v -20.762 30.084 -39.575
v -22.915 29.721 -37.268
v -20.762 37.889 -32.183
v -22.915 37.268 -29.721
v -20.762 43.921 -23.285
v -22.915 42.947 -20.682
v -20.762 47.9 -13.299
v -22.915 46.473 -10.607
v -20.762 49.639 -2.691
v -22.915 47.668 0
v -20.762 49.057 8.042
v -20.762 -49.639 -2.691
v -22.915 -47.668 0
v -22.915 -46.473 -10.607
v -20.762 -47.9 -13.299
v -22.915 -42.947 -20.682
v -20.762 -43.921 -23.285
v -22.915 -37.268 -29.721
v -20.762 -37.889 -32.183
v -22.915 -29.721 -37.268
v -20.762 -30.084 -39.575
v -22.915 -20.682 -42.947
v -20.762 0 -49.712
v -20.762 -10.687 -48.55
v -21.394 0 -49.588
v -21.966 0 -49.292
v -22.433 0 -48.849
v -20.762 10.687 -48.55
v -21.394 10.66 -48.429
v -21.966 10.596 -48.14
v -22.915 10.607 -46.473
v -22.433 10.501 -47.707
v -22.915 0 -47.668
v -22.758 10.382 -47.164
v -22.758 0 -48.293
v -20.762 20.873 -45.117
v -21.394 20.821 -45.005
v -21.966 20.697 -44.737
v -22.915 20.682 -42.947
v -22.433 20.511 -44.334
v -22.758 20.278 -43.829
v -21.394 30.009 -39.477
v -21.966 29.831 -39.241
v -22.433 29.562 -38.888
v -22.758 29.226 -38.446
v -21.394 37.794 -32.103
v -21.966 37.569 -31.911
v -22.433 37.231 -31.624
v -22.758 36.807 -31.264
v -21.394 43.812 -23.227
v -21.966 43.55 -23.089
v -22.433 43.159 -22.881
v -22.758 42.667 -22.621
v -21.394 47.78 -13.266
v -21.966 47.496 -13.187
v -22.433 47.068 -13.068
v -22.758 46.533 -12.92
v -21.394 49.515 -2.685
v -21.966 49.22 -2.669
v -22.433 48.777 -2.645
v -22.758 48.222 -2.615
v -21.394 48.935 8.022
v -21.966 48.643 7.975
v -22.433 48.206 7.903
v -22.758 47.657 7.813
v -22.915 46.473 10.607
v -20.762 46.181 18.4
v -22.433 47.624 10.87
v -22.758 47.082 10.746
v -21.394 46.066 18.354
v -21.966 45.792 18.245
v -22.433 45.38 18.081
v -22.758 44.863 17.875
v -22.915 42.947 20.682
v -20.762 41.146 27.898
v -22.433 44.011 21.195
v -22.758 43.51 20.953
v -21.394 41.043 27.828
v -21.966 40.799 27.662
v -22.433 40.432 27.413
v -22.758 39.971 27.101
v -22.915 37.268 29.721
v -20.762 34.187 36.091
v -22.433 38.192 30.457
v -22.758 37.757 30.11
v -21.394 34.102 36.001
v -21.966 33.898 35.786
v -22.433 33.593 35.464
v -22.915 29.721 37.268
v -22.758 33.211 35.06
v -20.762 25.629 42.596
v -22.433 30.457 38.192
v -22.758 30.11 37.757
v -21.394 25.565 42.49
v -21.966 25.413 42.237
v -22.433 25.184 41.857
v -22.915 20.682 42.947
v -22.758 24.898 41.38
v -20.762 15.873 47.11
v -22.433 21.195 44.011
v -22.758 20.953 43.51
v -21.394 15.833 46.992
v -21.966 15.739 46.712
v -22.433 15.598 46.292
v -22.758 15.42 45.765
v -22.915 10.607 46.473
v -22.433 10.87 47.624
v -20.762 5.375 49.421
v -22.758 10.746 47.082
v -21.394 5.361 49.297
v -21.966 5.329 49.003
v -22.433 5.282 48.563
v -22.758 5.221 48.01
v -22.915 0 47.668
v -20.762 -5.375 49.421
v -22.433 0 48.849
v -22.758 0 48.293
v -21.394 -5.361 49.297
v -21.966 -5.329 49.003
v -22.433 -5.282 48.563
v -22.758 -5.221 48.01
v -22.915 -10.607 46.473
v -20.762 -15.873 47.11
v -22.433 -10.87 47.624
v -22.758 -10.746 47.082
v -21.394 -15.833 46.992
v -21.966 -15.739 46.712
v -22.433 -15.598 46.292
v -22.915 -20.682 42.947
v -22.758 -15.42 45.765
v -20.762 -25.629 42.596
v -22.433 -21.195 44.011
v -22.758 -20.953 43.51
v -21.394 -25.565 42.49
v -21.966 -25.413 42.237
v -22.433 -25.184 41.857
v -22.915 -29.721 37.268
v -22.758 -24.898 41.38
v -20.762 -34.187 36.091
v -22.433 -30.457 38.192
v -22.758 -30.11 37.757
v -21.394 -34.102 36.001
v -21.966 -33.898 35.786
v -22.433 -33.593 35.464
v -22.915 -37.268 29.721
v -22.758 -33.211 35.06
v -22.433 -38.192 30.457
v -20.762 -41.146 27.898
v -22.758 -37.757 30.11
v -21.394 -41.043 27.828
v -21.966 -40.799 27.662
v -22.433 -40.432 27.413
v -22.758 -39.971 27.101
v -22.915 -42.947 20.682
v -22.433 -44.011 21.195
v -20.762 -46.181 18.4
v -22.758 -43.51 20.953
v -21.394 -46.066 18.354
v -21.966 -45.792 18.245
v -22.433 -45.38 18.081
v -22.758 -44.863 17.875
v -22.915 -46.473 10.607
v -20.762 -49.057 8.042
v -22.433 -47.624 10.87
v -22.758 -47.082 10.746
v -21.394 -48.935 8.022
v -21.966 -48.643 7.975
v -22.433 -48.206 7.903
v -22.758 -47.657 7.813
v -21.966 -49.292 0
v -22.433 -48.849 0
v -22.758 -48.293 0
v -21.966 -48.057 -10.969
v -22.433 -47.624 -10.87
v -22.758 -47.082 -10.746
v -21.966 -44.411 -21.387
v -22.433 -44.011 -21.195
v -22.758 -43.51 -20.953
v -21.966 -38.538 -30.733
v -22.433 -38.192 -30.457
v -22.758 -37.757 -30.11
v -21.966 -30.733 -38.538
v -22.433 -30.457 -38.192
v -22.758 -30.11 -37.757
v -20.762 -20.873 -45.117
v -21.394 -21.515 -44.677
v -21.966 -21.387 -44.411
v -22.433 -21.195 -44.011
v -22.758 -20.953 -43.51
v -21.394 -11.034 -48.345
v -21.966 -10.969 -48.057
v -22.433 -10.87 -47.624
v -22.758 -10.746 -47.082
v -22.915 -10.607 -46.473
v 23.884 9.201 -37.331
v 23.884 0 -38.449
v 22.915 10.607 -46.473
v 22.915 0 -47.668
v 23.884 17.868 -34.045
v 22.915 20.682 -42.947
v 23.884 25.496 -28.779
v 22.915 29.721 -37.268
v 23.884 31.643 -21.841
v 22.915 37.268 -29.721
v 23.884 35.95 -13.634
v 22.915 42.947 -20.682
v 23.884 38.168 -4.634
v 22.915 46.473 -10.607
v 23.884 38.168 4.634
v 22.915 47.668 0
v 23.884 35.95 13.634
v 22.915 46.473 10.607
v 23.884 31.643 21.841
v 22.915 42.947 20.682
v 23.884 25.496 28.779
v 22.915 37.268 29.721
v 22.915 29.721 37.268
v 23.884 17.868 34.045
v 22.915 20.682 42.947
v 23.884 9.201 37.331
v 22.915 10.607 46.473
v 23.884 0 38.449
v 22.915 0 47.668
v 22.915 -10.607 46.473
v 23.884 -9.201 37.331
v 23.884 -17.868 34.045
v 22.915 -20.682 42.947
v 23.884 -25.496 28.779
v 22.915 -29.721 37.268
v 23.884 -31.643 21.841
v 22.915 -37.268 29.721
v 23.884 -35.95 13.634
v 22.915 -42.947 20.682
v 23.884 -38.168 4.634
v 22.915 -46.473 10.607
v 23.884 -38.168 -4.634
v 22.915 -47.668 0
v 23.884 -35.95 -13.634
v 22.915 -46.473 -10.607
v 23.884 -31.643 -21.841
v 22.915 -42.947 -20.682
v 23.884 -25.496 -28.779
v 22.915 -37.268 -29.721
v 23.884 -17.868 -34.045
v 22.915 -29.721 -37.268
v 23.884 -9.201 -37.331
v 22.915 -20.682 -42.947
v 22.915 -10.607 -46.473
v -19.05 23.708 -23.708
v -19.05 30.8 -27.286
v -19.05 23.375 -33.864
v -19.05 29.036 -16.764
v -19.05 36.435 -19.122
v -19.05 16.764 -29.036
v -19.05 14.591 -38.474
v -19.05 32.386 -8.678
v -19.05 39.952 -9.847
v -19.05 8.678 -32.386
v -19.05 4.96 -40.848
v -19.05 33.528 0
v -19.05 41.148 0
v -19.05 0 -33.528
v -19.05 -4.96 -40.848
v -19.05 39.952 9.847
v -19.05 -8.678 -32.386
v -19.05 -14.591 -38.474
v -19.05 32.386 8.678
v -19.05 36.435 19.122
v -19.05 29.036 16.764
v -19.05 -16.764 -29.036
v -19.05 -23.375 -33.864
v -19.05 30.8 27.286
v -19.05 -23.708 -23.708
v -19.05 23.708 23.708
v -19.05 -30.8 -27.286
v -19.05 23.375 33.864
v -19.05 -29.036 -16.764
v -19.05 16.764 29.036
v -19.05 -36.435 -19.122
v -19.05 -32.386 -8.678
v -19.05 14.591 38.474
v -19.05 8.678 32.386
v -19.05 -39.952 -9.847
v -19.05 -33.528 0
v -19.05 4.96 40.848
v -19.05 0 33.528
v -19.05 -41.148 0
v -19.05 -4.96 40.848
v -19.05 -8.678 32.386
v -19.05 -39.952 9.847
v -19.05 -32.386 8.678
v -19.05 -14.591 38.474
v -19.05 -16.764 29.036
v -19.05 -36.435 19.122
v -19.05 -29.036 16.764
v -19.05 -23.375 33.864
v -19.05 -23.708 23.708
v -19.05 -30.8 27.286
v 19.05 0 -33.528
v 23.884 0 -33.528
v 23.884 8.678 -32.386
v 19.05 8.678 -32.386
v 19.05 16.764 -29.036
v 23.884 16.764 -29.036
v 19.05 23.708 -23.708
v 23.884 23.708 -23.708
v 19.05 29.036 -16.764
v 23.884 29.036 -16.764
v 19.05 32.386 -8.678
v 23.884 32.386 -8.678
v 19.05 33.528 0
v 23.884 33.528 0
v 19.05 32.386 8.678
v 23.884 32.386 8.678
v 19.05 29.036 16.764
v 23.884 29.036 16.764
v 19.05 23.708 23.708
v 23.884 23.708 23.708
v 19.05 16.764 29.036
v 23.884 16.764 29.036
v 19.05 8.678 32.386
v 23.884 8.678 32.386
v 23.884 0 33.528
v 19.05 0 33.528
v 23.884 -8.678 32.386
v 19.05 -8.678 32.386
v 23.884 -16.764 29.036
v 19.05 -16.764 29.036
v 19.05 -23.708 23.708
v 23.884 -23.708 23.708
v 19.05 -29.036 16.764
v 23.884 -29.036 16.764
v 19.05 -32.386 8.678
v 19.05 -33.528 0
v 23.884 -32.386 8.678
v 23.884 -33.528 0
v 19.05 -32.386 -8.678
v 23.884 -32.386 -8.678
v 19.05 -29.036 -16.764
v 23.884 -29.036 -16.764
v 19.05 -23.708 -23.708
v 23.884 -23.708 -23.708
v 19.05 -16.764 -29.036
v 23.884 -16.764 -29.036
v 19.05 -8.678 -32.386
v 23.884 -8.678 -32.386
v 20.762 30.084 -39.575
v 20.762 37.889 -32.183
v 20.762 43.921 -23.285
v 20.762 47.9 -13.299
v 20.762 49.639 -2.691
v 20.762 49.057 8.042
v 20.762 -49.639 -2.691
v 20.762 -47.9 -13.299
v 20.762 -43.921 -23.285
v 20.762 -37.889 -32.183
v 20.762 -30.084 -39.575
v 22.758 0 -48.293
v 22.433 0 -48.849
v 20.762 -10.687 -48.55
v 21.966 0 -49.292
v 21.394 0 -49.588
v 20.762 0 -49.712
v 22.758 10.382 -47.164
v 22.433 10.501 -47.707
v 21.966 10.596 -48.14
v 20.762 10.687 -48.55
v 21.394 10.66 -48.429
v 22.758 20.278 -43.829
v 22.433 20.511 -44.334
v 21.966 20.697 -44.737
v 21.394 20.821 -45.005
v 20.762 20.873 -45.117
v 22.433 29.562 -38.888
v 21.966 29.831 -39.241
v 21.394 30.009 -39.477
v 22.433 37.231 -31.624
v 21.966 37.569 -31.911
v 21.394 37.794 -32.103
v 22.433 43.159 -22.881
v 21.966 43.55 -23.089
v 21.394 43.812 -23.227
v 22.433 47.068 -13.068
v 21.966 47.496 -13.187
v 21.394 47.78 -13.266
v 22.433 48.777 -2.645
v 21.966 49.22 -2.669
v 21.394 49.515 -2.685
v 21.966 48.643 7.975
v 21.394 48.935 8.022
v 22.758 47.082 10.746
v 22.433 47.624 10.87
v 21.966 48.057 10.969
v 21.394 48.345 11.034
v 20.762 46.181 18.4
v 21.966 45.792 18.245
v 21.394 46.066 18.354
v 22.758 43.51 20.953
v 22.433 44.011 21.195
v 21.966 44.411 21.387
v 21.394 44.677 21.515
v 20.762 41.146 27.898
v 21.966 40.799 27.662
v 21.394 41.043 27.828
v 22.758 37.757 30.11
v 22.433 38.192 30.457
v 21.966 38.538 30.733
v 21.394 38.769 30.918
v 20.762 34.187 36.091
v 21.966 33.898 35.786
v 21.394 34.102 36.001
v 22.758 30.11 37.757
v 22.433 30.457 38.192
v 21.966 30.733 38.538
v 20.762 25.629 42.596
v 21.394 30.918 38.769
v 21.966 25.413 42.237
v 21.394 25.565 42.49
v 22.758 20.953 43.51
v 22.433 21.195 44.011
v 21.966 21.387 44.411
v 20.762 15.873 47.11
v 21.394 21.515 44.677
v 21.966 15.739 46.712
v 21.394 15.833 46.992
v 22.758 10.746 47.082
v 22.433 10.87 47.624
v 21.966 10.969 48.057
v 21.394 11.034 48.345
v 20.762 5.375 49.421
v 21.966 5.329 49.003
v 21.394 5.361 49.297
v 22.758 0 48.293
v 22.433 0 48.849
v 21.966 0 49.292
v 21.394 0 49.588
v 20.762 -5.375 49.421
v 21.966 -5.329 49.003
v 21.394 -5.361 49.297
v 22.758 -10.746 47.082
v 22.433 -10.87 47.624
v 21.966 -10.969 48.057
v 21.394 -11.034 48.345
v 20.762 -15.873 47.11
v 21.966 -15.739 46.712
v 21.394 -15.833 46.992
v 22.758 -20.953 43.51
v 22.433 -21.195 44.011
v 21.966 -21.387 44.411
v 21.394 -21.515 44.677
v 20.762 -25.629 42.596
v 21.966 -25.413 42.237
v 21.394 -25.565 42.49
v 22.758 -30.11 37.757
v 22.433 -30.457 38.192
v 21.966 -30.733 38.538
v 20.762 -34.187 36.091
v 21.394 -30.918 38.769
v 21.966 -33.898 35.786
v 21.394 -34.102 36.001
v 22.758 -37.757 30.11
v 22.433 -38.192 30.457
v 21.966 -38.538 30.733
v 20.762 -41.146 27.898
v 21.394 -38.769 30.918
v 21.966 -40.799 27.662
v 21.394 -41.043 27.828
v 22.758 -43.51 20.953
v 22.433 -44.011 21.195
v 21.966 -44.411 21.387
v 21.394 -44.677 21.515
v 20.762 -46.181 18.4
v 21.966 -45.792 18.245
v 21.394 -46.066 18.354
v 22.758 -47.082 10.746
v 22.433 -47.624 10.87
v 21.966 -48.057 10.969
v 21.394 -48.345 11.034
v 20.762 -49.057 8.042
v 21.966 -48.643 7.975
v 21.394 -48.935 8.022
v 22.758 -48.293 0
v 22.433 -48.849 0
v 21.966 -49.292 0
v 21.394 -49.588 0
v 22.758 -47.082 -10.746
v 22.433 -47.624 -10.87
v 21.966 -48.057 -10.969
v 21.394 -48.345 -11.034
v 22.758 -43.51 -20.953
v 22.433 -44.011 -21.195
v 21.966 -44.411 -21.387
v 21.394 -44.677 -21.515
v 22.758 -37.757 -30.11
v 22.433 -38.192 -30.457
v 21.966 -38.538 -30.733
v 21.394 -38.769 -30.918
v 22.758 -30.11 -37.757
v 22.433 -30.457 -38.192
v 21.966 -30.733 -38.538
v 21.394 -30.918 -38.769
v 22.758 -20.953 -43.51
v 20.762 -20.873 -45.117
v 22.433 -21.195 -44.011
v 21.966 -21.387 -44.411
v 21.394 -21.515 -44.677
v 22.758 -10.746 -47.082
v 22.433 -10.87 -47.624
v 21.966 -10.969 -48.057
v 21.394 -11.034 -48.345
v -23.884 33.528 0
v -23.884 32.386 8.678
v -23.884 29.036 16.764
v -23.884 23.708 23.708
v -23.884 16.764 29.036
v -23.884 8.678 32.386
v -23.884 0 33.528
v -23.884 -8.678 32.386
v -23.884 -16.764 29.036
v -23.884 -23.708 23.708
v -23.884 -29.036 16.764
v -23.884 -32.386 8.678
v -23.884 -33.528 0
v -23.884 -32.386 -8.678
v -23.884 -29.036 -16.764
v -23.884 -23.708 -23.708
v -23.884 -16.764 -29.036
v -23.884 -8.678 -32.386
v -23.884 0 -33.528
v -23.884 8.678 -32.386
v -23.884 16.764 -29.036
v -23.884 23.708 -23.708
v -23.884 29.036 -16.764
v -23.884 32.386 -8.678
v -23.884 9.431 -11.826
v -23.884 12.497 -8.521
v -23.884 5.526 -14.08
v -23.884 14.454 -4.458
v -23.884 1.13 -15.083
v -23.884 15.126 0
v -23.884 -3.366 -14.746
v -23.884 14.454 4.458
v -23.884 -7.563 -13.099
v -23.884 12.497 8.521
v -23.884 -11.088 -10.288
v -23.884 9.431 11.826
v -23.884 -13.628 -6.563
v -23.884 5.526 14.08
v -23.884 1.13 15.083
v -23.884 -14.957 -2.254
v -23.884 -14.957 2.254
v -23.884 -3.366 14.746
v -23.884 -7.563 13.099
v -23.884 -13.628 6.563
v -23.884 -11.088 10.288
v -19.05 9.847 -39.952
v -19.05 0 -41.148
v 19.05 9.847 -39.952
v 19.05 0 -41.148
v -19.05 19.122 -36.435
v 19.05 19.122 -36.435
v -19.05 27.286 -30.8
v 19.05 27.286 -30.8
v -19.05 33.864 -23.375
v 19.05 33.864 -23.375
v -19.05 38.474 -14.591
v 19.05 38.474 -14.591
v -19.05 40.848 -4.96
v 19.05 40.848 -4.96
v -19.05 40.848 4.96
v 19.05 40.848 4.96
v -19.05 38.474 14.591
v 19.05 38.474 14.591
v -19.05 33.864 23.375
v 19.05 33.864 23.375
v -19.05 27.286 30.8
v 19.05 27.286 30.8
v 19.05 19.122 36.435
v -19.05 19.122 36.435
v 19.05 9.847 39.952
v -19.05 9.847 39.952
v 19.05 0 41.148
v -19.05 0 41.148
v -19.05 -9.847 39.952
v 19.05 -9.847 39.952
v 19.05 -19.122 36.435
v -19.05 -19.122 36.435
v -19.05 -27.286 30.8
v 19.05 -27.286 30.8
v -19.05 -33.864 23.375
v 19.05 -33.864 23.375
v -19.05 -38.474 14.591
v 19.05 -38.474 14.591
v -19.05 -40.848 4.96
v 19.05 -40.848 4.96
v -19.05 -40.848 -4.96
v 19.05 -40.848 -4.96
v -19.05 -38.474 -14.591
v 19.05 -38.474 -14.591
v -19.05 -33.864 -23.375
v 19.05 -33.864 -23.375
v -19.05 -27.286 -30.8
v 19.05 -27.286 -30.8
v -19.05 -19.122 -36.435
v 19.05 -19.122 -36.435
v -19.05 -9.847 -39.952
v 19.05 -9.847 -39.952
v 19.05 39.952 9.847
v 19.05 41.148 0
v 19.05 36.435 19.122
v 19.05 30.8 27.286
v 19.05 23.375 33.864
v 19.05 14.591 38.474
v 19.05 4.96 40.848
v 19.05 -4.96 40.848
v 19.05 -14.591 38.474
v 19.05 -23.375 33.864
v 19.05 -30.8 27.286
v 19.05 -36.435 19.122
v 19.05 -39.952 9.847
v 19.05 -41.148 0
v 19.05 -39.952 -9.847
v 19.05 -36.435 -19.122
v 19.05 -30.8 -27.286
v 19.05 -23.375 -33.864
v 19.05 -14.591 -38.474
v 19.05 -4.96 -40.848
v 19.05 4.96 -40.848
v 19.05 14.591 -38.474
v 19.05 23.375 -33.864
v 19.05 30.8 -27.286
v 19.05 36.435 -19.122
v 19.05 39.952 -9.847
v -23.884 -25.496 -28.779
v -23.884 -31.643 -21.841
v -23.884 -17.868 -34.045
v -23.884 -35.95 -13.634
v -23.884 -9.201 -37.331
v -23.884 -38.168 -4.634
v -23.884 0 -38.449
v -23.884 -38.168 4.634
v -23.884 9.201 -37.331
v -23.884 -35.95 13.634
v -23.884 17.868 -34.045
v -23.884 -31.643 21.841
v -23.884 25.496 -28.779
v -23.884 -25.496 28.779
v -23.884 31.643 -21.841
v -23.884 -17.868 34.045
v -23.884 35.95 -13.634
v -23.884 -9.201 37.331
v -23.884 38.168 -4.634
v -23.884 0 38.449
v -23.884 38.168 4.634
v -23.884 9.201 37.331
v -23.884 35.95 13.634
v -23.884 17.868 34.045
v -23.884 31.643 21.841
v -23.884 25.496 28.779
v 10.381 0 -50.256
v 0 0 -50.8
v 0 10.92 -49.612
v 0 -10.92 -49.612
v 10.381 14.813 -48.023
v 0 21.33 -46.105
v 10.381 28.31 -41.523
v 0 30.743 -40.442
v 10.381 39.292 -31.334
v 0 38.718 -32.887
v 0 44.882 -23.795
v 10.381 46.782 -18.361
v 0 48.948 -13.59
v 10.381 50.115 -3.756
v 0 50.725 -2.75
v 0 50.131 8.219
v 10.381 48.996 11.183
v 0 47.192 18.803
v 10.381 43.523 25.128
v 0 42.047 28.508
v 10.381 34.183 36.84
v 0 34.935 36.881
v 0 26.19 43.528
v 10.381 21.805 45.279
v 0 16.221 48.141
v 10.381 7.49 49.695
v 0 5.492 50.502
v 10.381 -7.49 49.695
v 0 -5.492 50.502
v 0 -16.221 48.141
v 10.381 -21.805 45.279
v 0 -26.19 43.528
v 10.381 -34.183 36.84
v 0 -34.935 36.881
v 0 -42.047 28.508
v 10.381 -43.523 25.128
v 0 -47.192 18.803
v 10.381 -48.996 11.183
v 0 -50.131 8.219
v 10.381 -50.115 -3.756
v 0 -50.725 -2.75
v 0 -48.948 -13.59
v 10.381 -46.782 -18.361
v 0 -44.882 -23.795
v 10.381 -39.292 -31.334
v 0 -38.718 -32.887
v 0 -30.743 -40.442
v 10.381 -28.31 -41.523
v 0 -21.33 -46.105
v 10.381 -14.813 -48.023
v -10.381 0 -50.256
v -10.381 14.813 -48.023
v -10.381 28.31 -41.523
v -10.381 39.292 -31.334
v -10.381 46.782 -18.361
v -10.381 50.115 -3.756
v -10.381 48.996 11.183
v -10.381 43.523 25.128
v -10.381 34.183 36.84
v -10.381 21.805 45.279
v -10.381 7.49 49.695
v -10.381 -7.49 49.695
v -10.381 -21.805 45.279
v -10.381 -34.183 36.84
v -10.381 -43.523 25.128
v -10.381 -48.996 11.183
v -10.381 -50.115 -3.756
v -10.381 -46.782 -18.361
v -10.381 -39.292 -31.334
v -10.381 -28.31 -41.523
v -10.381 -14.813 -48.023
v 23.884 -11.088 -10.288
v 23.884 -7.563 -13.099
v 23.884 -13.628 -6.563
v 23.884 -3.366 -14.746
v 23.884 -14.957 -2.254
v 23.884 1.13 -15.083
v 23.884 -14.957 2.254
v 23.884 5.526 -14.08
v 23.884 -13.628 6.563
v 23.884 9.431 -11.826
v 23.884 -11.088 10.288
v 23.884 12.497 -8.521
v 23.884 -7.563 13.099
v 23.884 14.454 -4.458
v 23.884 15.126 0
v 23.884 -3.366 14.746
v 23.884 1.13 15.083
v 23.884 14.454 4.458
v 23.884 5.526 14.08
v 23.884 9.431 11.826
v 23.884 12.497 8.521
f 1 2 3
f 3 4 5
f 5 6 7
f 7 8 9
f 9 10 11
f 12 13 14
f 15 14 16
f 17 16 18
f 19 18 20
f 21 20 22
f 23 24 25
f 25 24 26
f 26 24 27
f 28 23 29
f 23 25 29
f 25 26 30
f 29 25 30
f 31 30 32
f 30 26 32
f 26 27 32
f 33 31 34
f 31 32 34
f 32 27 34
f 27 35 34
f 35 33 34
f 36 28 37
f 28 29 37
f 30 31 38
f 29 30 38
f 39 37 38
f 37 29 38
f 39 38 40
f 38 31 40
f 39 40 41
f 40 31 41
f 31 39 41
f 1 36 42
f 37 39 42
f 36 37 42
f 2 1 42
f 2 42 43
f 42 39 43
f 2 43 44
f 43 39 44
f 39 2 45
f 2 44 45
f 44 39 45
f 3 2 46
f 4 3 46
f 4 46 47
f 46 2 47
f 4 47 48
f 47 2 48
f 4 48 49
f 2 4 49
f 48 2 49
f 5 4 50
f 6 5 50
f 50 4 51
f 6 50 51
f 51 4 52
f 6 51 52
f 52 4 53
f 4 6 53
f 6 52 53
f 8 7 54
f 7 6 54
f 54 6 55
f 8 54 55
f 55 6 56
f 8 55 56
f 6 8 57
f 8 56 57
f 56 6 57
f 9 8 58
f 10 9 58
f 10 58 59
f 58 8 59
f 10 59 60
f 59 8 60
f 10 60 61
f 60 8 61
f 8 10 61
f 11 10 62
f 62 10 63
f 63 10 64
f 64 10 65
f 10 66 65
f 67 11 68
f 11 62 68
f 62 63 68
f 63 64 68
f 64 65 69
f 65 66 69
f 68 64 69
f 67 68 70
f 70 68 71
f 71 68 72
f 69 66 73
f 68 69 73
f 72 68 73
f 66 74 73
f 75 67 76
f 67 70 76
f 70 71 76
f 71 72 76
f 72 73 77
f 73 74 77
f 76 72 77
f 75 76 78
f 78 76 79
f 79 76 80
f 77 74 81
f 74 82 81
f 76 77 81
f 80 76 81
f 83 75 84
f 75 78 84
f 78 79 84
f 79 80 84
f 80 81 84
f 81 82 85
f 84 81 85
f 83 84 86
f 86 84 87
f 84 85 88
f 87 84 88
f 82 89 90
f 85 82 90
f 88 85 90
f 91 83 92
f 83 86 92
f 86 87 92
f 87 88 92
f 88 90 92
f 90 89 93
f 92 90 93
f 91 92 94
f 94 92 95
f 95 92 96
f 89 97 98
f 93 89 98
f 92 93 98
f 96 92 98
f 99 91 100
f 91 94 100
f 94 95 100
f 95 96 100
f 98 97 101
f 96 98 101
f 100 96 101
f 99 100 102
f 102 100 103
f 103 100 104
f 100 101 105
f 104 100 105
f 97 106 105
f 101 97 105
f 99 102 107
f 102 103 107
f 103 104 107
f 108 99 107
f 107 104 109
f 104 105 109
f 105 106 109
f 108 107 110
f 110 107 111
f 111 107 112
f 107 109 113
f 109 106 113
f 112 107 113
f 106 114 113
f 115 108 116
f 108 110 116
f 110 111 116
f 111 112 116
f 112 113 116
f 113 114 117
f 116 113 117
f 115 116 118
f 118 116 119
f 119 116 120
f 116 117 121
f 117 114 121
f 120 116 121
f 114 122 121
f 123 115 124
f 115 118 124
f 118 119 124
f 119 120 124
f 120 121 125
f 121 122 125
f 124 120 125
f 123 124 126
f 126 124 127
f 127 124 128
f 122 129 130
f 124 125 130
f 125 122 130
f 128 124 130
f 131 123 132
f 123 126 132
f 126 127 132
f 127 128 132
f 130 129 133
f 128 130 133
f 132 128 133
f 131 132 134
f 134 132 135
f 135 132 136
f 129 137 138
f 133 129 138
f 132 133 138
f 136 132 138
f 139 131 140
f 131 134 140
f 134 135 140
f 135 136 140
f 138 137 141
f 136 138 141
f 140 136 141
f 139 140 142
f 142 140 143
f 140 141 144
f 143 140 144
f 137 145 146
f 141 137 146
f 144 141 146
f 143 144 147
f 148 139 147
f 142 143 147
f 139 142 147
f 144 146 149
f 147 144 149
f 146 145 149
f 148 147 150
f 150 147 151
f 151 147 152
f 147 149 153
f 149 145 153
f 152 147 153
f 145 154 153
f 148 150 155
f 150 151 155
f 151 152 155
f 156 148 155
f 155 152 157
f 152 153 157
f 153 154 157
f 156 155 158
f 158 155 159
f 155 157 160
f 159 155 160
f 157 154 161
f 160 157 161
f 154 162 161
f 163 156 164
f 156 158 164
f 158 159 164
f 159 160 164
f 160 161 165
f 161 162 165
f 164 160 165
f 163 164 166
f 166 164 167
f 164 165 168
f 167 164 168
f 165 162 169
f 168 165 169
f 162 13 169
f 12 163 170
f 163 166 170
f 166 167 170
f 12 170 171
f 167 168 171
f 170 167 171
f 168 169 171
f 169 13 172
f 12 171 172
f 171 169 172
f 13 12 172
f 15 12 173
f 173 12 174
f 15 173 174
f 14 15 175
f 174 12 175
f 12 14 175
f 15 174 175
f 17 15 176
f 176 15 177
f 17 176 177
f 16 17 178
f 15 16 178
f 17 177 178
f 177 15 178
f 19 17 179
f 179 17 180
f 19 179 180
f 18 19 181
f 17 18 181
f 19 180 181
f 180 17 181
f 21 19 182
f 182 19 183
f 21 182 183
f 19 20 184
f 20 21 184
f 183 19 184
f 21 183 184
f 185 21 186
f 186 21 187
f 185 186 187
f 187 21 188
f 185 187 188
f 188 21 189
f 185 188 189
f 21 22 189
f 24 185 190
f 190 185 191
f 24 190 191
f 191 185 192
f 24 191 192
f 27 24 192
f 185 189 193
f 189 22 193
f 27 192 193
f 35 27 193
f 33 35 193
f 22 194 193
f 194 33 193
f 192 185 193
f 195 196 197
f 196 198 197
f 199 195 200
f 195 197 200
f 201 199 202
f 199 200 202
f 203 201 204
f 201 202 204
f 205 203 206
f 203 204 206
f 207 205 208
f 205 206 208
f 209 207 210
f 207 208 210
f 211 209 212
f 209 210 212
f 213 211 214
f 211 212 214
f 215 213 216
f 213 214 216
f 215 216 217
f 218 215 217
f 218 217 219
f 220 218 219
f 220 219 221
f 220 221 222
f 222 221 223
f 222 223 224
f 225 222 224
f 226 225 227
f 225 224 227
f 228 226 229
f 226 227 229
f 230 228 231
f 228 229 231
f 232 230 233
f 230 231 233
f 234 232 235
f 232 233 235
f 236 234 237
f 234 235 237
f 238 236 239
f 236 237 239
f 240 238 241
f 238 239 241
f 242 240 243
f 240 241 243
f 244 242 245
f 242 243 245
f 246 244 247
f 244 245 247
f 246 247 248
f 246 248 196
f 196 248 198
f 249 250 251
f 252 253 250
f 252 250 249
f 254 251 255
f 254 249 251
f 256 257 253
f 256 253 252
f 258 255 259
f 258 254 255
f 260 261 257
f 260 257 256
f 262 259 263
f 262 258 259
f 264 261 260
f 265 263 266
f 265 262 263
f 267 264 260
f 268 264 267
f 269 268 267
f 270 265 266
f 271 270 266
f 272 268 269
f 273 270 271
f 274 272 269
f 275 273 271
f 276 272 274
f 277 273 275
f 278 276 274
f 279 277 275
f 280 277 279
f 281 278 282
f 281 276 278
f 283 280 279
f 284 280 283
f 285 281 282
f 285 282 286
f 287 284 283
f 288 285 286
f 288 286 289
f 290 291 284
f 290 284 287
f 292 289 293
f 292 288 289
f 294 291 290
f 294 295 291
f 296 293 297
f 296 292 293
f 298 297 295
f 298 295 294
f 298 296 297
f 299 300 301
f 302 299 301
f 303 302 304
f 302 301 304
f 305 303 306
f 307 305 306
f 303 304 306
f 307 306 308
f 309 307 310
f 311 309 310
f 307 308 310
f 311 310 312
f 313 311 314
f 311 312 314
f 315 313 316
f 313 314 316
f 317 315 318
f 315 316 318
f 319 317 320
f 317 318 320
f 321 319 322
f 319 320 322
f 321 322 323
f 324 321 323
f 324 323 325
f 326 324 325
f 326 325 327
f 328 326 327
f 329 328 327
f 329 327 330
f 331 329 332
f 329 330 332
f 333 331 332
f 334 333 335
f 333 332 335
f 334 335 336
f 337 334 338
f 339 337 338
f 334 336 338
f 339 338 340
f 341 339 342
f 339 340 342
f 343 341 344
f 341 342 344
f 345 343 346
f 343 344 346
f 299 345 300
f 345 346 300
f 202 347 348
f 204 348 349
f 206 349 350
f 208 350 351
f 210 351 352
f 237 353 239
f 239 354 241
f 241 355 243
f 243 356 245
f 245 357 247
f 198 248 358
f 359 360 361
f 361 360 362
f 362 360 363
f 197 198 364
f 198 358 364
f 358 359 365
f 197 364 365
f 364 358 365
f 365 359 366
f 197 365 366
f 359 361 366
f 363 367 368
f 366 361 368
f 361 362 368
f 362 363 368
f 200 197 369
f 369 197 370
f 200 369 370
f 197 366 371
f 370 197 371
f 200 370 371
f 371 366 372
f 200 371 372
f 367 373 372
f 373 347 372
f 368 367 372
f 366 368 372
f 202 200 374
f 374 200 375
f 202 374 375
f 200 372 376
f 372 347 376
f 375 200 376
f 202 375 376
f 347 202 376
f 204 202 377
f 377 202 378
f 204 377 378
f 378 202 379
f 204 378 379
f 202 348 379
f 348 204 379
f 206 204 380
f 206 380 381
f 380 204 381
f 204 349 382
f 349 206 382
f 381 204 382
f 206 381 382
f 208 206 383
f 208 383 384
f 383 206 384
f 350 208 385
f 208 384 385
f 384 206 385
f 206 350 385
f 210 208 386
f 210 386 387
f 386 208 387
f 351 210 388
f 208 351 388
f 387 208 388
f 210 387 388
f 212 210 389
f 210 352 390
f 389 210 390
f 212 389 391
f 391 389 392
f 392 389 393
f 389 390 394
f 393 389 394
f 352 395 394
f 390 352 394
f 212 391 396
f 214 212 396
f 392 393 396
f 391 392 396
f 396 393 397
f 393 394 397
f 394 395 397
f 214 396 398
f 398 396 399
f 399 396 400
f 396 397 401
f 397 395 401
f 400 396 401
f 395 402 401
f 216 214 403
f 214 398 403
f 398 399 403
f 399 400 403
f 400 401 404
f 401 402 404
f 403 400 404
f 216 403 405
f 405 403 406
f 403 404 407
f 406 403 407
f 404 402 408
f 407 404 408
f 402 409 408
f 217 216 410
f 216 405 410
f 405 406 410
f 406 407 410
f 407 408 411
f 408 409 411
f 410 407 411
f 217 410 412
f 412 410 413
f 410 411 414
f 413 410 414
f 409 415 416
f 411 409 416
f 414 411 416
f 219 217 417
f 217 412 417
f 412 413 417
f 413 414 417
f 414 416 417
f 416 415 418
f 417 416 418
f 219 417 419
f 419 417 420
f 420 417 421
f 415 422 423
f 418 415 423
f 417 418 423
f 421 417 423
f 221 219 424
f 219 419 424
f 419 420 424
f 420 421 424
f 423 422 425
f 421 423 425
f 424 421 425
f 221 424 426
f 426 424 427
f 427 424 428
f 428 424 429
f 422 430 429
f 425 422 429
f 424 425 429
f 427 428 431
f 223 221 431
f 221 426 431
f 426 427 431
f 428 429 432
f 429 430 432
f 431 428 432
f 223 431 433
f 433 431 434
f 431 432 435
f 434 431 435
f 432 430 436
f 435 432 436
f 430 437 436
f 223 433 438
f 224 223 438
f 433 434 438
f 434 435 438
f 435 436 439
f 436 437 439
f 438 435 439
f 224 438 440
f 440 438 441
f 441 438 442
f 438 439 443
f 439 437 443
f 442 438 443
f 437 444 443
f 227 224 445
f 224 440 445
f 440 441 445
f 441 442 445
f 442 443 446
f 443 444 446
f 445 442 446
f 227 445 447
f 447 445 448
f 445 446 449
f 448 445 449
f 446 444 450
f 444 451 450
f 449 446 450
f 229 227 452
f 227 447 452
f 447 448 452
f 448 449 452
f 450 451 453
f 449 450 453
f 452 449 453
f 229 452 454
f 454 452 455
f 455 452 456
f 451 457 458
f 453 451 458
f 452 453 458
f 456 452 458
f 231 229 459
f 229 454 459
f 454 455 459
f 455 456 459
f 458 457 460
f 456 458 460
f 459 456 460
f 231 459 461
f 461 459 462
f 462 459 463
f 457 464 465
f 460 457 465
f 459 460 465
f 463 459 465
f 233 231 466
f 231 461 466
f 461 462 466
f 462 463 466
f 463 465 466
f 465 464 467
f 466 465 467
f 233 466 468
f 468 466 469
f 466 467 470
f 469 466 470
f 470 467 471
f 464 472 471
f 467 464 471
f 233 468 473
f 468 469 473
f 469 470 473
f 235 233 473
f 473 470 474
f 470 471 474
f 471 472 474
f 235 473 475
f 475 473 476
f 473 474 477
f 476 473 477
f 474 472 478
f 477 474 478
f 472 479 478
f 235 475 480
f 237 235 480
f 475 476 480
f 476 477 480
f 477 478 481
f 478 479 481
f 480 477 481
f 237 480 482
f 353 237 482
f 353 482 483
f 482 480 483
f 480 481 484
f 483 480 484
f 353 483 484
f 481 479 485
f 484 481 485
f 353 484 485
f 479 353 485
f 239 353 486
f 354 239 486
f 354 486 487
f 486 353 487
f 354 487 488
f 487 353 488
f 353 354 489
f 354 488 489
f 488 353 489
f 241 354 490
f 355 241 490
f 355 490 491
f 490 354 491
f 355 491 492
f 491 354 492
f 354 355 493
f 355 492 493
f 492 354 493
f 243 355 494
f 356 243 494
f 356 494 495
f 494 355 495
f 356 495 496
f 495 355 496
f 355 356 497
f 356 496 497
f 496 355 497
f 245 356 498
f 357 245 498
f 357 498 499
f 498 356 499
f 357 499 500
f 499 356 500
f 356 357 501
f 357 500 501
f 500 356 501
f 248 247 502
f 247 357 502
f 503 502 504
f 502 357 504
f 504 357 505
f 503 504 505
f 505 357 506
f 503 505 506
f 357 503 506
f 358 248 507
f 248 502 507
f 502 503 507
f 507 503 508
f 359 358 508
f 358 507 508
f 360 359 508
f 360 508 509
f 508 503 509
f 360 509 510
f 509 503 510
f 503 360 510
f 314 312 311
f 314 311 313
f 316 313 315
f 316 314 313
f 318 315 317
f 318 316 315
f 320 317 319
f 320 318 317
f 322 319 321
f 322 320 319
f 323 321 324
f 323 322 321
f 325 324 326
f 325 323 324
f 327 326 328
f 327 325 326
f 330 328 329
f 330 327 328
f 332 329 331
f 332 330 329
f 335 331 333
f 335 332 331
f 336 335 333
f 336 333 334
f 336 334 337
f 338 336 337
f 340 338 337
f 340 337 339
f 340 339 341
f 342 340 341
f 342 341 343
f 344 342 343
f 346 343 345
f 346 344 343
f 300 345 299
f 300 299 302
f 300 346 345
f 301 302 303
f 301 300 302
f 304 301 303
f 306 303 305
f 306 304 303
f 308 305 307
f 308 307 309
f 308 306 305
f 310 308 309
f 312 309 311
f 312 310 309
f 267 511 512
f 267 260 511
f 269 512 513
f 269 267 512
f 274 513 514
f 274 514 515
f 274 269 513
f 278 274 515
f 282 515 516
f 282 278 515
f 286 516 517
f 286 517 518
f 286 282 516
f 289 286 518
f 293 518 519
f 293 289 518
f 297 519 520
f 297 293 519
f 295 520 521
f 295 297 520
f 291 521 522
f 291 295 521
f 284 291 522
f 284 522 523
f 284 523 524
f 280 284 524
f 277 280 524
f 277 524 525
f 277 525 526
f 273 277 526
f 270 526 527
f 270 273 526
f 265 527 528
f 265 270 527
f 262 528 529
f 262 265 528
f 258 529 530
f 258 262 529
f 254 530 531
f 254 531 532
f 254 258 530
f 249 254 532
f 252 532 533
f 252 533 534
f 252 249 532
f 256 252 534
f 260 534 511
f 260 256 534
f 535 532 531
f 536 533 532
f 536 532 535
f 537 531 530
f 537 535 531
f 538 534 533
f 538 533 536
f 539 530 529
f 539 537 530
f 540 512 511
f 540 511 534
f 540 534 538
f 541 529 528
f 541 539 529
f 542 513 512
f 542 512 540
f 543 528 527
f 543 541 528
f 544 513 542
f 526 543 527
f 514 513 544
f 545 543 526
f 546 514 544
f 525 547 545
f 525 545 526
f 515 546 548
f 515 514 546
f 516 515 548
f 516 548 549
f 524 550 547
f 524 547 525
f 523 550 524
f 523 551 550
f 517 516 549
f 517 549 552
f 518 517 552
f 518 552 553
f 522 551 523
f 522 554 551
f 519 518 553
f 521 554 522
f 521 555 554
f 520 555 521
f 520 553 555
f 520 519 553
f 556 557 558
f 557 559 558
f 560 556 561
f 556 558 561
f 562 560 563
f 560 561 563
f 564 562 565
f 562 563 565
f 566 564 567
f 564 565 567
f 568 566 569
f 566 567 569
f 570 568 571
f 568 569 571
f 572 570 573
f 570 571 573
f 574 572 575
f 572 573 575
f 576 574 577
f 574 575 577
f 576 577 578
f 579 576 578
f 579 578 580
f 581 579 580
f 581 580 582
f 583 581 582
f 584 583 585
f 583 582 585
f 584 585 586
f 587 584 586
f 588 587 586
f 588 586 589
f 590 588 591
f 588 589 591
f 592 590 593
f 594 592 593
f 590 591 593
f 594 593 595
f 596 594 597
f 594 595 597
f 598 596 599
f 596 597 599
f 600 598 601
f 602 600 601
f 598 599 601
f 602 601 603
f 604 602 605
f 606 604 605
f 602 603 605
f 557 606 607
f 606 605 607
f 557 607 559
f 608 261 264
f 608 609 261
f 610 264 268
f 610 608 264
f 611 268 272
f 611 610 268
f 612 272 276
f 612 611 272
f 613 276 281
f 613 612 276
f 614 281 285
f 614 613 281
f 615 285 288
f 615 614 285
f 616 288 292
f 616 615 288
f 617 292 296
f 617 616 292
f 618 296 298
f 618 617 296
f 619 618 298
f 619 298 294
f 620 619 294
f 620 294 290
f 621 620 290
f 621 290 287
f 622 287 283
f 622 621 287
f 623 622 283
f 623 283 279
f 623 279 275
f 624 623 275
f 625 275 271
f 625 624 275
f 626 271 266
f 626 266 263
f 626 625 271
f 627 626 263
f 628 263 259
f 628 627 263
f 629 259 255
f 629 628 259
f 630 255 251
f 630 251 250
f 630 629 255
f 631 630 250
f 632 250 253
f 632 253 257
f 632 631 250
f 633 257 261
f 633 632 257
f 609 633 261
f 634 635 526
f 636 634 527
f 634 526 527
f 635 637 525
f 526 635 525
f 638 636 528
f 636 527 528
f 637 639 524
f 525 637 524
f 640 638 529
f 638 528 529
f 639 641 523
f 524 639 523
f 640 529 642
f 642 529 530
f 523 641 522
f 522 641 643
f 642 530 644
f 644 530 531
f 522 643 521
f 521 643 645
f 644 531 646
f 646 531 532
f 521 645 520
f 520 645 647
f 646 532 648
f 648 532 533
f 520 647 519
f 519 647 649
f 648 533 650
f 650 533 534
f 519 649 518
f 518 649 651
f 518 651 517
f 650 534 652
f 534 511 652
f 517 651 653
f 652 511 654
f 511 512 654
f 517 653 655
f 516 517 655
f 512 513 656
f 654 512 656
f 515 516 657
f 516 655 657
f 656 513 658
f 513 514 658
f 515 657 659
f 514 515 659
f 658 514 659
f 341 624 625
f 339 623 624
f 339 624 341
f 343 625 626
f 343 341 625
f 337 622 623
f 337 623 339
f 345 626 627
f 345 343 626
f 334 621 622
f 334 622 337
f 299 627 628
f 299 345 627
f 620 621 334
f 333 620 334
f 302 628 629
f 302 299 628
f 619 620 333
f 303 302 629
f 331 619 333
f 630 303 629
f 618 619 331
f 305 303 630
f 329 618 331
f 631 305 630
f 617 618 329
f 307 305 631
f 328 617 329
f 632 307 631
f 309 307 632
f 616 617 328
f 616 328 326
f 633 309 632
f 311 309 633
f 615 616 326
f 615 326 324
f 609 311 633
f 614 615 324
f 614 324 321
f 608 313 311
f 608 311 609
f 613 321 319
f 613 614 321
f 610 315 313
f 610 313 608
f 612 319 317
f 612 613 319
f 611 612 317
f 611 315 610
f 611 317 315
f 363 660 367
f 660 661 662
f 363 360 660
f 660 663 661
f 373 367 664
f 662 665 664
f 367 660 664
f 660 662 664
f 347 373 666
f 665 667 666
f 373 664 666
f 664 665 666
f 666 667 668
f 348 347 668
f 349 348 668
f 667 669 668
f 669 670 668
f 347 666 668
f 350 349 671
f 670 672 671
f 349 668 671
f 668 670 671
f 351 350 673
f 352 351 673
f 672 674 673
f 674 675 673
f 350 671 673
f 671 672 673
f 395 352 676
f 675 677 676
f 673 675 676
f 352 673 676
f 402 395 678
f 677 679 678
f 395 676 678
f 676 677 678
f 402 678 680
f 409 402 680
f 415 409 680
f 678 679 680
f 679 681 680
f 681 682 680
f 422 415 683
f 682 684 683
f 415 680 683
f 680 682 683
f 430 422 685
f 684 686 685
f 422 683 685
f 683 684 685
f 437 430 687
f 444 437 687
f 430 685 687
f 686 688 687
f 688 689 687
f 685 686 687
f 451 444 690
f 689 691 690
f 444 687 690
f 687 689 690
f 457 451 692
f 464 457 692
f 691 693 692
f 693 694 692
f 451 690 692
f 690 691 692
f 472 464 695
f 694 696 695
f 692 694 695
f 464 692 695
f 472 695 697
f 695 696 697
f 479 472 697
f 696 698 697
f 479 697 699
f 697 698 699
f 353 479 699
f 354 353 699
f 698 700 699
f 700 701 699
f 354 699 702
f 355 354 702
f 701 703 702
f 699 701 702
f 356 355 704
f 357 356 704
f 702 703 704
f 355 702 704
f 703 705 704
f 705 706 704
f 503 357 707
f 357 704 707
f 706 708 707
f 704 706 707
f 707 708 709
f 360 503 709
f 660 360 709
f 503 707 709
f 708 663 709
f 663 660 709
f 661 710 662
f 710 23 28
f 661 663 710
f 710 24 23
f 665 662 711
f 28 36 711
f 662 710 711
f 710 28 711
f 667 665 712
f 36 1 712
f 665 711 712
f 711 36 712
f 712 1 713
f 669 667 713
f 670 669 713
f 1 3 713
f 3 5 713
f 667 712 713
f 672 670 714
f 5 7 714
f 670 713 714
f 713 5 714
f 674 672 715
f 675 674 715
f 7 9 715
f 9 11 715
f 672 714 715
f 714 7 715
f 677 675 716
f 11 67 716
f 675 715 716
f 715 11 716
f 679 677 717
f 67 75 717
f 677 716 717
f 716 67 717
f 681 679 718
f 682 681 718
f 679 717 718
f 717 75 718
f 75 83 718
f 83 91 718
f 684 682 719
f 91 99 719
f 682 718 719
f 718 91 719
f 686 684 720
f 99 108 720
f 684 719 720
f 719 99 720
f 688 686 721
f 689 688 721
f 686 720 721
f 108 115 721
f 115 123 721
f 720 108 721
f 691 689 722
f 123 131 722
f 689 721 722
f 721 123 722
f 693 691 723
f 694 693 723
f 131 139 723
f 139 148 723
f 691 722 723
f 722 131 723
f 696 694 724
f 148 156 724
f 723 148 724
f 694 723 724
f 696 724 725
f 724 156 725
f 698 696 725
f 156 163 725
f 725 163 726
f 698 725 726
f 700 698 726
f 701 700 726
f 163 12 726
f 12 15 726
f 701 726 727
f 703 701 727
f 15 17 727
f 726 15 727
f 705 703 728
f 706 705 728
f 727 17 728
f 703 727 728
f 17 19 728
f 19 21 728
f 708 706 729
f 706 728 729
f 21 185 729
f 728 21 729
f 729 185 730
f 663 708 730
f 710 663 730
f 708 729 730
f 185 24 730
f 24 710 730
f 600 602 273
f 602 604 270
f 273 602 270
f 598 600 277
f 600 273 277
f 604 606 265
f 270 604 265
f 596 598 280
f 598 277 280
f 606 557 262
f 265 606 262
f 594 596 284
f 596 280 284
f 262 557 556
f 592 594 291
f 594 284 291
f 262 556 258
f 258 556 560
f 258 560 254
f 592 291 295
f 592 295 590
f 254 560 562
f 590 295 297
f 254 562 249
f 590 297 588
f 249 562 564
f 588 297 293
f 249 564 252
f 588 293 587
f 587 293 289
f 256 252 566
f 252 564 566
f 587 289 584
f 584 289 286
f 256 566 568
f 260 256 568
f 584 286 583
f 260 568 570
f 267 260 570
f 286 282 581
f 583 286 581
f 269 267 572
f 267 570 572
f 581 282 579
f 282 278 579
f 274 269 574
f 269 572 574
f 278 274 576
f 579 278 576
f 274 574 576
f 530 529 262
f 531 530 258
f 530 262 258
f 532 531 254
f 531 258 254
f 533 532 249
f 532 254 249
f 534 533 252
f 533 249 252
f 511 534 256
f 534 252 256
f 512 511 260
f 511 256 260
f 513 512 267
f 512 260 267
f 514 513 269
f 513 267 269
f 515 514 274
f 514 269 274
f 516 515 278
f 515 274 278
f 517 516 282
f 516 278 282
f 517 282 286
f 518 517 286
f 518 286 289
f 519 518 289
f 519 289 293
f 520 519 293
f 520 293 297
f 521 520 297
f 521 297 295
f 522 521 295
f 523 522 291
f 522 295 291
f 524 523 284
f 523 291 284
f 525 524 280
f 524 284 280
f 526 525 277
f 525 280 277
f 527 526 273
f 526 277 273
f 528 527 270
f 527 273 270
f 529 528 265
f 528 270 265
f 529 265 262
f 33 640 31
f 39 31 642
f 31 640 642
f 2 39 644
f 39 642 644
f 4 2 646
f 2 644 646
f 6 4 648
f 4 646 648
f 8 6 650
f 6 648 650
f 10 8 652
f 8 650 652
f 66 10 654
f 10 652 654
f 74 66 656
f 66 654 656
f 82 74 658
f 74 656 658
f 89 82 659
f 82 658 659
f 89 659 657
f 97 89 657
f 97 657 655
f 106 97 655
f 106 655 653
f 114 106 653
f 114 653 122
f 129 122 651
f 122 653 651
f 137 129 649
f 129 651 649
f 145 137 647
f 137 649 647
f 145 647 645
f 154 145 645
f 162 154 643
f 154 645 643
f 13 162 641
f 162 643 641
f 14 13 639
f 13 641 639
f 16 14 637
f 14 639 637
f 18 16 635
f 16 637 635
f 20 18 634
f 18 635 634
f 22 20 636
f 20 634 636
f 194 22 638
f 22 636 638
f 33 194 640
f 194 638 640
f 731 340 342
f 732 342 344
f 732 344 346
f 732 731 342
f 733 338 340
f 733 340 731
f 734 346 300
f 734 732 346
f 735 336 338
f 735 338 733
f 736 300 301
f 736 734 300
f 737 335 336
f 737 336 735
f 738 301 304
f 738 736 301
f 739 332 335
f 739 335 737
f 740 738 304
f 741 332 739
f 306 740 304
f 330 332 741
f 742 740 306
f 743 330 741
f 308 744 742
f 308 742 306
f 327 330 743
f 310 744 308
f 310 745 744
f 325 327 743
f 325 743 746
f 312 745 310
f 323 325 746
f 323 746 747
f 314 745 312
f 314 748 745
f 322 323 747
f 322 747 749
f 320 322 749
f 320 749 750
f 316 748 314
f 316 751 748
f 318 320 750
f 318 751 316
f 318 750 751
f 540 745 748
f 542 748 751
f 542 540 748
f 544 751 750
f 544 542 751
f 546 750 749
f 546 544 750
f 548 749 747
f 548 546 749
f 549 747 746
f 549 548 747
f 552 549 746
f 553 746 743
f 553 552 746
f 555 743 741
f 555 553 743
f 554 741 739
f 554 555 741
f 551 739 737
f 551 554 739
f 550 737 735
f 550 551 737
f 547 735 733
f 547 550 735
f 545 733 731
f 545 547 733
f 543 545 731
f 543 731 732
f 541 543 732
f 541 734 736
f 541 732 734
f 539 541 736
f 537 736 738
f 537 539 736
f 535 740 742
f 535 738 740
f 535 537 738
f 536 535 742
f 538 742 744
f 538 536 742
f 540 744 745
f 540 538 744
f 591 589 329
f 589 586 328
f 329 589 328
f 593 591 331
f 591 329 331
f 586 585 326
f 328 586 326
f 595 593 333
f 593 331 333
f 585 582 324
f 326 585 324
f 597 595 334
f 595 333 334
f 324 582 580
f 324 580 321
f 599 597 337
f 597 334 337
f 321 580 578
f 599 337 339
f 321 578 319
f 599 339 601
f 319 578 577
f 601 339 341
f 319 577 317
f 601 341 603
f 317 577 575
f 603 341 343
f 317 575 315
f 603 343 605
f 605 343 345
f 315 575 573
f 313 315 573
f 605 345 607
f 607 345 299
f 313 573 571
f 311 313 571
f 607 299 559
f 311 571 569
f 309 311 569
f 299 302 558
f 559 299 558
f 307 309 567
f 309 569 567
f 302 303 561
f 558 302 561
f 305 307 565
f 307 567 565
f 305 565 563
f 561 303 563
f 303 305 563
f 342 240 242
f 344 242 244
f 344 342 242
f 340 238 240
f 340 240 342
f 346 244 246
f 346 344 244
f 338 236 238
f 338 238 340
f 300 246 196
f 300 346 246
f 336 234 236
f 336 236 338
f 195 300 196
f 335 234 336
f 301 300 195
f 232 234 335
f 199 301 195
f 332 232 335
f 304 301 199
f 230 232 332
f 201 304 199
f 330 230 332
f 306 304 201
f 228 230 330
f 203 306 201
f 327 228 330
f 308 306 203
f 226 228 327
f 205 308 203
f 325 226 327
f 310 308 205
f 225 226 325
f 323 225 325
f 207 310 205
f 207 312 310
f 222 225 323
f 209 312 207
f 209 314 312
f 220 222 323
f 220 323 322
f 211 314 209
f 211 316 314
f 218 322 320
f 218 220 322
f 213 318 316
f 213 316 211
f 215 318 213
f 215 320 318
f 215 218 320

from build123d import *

# Parameters (mm, degrees)
SKETCH3_W          = 17.199413367
SKETCH3_H          = 109.667546616
CUT_EXTRUDE4_DEPTH = 76.2


# Read off the part's stored shape, not the designer's step: Cut-Extrude3
with BuildPart() as part:
    # Sketch1 → Revolve1 (revolve)
    with BuildSketch(Plane.XY, mode=Mode.PRIVATE) as revolve1_sk:
        with BuildLine():
            Line((20.761521884, 49.711934744), (0, 50.8))
            Line((0, 50.8), (-20.761521884, 49.711934744))
            ThreePointArc((-20.761521884, 49.711934744), (-22.215460448, 49.087273439), (-22.915358941, 47.668019694))
            Line((-22.915358941, 47.668019694), (-23.884348631, 38.448698622))
            ThreePointArc((-23.884348631, 38.448698622), (-24.380244956, 37.475447286), (-25.4, 37.084))
            Line((-25.4, 37.084), (-25.4, 33.528))
            Line((-25.4, 33.528), (-19.05, 33.528))
            Line((-19.05, 33.528), (-19.05, 41.148))
            Line((-19.05, 41.148), (19.05, 41.148))
            Line((19.05, 41.148), (19.05, 33.528))
            Line((19.05, 33.528), (25.4, 33.528))
            Line((25.4, 33.528), (25.4, 37.084))
            ThreePointArc((25.4, 37.084), (24.380244956, 37.475447286), (23.884348631, 38.448698622))
            Line((23.884348631, 38.448698622), (22.915358941, 47.668019694))
            ThreePointArc((22.915358941, 47.668019694), (22.215460448, 49.087273439), (20.761521884, 49.711934744))
        make_face()
    revolve(revolve1_sk.sketch.rotate(Axis((-25.4, 0, 0), (1, 0, 0)), 270), axis=Axis((-25.4, 0, 0), (1, 0, 0)))

    # Cut-Extrude3 outline → Cut-Extrude3 (revolve, cut)
    with BuildSketch(Plane.YX):
        with BuildLine():
            Line((38.448698622, -23.884348631), (33.528, -23.884348631))
            Line((33.528, -23.884348631), (33.528, -25.4))
            Line((33.528, -25.4), (37.084, -25.4))
            ThreePointArc((37.084, -25.4), (37.475447286, -24.380244956), (38.448698622, -23.884348631))
        make_face()
    revolve(axis=Axis((0, 0, 0), (1, 0, 0)), mode=Mode.SUBTRACT)


with BuildPart() as body_2:
    # Cut-Extrude3 2 outline → Cut-Extrude3 2 (revolve)
    with BuildSketch(Plane.YX):
        with BuildLine():
            Line((26.416, 27.7749), (15.1257, 27.7749))
            Line((15.1257, 27.7749), (15.1257, -23.884348631))
            Line((15.1257, -23.884348631), (33.528, -23.884348631))
            Line((33.528, -23.884348631), (33.528, -19.05))
            Line((33.528, -19.05), (41.148, -19.05))
            Line((41.148, -19.05), (41.148, 19.05))
            Line((41.148, 19.05), (33.528, 19.05))
            Line((33.528, 19.05), (33.528, 25.4))
            Line((33.528, 25.4), (28.702, 25.4))
            Line((28.702, 25.4), (28.702, 25.4889))
            ThreePointArc((28.702, 25.4889), (28.032446102, 27.105346102), (26.416, 27.7749))
        make_face()
    revolve(axis=Axis((0, 0, 0), (1, 0, 0)))


with BuildPart() as cut_extrude4_tool:
    # Sketch3 → Cut-Extrude4 (new, symmetric)
    with BuildSketch(Plane.XY):
        with Locations((32.484055314, 4.086989315)):
            Rectangle(SKETCH3_W, SKETCH3_H)
    extrude(amount=CUT_EXTRUDE4_DEPTH, both=True)


with BuildPart() as part_1:
    add(part.part)

    # Cut-Extrude4: cut by cut_extrude4_tool
    add(cut_extrude4_tool.part, mode=Mode.SUBTRACT)


with BuildPart() as body_2_1:
    add(body_2.part)

    # Cut-Extrude4: cut by cut_extrude4_tool
    add(cut_extrude4_tool.part, mode=Mode.SUBTRACT)


solid = Compound([part_1.part, body_2_1.part])
